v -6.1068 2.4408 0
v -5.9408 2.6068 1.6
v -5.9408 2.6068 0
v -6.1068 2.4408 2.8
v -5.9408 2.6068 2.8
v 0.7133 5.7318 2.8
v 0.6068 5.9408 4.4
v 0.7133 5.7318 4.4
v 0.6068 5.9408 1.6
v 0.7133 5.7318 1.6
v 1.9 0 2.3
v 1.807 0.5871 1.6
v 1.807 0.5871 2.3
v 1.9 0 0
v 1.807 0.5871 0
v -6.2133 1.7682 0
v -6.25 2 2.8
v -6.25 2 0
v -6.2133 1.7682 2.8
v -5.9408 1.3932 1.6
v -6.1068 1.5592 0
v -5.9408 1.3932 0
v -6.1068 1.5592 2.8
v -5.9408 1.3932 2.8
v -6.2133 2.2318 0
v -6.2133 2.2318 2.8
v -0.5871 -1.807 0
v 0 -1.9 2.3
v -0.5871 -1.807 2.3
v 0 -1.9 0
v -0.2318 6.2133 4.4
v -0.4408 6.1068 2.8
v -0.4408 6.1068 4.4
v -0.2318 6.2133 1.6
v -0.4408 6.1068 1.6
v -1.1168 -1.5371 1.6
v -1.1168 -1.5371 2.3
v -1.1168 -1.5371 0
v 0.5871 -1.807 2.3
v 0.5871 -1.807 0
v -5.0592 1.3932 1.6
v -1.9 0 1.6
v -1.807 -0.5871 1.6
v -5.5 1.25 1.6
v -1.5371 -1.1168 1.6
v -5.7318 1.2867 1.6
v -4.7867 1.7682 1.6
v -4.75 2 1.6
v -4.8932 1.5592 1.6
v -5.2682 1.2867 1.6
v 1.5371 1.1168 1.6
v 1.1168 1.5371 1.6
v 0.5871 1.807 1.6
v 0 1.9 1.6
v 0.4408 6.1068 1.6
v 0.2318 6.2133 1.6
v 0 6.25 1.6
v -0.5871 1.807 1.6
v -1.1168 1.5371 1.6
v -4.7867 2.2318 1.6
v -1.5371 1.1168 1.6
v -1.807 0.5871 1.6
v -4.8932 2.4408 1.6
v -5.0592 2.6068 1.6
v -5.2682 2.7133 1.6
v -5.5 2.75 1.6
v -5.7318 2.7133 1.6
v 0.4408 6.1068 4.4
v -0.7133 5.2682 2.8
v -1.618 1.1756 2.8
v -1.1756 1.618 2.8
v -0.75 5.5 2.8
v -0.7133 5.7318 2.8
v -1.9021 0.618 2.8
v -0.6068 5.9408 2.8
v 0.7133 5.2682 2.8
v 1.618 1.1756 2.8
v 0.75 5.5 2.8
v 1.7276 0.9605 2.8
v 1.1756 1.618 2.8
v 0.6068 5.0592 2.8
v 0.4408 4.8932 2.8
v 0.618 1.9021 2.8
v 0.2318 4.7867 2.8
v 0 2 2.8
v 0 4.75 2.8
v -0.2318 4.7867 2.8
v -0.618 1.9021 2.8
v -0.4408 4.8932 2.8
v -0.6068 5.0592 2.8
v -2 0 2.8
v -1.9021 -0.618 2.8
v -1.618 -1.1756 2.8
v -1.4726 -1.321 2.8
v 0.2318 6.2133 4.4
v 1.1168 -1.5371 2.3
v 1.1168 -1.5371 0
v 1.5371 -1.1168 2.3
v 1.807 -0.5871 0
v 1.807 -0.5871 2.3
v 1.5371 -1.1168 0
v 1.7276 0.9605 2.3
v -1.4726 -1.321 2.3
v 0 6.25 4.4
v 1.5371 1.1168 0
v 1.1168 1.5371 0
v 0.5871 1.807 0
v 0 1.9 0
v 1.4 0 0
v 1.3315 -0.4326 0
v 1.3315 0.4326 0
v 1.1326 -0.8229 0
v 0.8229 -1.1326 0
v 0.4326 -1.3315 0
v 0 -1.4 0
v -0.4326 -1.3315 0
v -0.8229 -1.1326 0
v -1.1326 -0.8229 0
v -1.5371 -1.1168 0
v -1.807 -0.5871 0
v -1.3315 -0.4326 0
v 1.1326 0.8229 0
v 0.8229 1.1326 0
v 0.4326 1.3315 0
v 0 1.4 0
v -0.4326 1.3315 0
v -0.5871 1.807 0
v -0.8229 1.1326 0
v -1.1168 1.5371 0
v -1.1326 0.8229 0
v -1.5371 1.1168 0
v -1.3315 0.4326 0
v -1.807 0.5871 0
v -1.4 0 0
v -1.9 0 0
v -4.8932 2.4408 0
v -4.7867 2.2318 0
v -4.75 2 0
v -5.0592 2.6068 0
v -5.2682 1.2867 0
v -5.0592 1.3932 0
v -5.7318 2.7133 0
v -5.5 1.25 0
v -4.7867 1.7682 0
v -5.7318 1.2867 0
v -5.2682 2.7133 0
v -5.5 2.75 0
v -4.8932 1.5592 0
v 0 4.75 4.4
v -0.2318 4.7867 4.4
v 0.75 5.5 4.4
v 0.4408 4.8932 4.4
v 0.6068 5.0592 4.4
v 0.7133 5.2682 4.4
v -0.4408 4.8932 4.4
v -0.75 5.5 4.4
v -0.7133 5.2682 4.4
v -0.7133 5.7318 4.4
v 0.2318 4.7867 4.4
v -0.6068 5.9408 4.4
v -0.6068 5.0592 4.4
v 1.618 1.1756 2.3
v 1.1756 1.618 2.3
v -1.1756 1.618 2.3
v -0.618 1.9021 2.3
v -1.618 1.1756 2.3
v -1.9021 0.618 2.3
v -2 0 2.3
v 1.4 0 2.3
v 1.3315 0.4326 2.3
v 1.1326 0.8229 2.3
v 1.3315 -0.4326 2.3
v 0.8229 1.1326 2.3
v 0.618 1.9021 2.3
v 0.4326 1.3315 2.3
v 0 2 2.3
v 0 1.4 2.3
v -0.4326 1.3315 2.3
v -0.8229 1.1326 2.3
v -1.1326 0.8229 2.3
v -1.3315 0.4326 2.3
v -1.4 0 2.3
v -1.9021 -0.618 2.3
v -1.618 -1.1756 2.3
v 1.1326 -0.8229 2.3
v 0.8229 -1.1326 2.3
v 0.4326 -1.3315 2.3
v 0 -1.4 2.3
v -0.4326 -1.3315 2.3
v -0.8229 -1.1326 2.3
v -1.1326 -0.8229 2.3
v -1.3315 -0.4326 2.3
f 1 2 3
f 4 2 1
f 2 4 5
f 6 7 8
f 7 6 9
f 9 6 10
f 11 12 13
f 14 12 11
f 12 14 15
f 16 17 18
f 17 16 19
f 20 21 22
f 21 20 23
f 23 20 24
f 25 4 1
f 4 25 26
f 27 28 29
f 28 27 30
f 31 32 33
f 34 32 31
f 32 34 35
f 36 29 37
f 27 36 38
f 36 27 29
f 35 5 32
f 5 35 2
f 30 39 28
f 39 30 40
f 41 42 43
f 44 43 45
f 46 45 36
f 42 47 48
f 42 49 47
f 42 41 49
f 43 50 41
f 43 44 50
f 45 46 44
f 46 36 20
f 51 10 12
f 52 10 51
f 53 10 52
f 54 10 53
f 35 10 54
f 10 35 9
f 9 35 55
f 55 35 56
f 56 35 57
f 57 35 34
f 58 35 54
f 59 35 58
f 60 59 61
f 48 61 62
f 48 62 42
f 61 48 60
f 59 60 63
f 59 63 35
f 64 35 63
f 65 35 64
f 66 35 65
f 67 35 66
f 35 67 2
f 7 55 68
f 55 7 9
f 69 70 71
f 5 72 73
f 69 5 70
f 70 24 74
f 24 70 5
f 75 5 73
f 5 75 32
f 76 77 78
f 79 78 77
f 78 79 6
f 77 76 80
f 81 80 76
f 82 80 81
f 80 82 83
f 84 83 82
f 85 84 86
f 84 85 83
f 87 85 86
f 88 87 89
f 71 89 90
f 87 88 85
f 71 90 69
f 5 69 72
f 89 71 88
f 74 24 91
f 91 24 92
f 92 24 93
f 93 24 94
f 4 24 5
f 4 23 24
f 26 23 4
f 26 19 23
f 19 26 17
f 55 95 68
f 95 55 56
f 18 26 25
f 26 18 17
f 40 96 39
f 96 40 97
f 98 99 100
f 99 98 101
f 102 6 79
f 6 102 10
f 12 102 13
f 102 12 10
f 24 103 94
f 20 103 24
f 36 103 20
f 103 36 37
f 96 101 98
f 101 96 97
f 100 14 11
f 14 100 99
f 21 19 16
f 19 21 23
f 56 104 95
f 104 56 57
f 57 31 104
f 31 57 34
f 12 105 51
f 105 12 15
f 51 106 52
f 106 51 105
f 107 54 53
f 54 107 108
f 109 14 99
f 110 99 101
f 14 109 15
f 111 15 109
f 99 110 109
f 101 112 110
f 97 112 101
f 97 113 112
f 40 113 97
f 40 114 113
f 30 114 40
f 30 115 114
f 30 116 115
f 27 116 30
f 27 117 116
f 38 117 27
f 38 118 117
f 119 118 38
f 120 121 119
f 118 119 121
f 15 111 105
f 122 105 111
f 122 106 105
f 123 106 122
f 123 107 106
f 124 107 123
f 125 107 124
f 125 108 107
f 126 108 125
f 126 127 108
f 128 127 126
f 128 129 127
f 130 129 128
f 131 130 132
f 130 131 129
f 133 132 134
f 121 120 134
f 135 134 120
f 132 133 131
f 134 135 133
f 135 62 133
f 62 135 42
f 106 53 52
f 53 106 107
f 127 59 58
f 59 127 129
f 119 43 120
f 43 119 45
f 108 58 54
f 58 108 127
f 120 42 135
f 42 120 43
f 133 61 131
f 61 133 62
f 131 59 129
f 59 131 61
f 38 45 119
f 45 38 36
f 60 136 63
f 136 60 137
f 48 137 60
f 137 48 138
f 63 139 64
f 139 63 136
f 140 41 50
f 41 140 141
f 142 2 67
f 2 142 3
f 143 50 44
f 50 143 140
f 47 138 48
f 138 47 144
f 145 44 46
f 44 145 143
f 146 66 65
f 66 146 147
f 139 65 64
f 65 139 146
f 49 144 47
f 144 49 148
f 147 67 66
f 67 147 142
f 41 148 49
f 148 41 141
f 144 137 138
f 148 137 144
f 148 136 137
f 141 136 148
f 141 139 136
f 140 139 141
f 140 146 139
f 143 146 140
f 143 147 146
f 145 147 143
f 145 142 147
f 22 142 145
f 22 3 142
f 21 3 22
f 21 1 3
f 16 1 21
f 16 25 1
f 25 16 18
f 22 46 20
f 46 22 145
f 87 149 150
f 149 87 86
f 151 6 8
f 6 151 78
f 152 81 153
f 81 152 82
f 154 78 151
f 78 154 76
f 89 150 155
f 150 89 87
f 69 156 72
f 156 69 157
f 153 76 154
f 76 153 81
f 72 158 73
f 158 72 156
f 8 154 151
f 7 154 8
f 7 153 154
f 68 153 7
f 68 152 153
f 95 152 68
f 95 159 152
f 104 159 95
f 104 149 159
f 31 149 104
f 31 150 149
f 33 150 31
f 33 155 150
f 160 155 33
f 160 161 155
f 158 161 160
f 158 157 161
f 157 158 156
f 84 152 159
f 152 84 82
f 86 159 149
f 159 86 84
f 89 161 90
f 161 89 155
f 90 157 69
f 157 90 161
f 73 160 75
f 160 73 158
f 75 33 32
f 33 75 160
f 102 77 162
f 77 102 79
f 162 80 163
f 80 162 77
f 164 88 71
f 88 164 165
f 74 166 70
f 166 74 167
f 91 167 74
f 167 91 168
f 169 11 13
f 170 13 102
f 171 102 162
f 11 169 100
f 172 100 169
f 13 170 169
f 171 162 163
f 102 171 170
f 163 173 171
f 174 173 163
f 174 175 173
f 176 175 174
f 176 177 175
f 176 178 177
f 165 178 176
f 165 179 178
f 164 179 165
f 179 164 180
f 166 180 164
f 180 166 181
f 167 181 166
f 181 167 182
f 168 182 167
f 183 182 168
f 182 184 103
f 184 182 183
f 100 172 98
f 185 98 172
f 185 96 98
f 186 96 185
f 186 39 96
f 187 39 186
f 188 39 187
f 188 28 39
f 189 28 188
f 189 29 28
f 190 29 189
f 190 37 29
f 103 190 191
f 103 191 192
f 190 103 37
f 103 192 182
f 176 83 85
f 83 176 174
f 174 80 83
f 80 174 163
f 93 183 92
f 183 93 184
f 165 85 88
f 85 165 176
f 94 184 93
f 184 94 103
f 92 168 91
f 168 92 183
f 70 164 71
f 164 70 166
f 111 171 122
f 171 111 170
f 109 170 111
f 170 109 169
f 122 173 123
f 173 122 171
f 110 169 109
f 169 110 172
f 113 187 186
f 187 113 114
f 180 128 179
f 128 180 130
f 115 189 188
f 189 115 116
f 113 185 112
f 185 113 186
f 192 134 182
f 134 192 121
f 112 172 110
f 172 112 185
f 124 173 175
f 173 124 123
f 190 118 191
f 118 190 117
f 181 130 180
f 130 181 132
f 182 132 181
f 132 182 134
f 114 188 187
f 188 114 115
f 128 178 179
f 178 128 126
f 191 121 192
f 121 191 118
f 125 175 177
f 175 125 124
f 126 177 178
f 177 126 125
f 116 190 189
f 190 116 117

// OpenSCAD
c1 = [0,0];
c2 = [-5.5,2];
c3 = [0,5.5];
t = 1.2;    // plate thickness
h = 1.6;    // height of pins
delta = 0.1;
hole = 2.8;

$fn=20;

difference()
{
  union()
  {
    translate([0,0,h])
      hull()
      {
        translate(c1) cylinder(h=t, d=3.8);
        translate(c2) cylinder(h=t, d=1.5);
        translate(c3) cylinder(h=t, d=1.5);
      }

    translate(c1) cylinder(h=h, d=3.8);
    translate(c2) cylinder(h=h, d=1.5);
    translate([0,0,h+t]) translate(c3) cylinder(h=h, d=1.5);
  }
  translate([0,0,h+t-0.5])
    cylinder(d=3.8+0.2, h=0.6);
  cylinder(d=hole, h=h+t+delta);
}
